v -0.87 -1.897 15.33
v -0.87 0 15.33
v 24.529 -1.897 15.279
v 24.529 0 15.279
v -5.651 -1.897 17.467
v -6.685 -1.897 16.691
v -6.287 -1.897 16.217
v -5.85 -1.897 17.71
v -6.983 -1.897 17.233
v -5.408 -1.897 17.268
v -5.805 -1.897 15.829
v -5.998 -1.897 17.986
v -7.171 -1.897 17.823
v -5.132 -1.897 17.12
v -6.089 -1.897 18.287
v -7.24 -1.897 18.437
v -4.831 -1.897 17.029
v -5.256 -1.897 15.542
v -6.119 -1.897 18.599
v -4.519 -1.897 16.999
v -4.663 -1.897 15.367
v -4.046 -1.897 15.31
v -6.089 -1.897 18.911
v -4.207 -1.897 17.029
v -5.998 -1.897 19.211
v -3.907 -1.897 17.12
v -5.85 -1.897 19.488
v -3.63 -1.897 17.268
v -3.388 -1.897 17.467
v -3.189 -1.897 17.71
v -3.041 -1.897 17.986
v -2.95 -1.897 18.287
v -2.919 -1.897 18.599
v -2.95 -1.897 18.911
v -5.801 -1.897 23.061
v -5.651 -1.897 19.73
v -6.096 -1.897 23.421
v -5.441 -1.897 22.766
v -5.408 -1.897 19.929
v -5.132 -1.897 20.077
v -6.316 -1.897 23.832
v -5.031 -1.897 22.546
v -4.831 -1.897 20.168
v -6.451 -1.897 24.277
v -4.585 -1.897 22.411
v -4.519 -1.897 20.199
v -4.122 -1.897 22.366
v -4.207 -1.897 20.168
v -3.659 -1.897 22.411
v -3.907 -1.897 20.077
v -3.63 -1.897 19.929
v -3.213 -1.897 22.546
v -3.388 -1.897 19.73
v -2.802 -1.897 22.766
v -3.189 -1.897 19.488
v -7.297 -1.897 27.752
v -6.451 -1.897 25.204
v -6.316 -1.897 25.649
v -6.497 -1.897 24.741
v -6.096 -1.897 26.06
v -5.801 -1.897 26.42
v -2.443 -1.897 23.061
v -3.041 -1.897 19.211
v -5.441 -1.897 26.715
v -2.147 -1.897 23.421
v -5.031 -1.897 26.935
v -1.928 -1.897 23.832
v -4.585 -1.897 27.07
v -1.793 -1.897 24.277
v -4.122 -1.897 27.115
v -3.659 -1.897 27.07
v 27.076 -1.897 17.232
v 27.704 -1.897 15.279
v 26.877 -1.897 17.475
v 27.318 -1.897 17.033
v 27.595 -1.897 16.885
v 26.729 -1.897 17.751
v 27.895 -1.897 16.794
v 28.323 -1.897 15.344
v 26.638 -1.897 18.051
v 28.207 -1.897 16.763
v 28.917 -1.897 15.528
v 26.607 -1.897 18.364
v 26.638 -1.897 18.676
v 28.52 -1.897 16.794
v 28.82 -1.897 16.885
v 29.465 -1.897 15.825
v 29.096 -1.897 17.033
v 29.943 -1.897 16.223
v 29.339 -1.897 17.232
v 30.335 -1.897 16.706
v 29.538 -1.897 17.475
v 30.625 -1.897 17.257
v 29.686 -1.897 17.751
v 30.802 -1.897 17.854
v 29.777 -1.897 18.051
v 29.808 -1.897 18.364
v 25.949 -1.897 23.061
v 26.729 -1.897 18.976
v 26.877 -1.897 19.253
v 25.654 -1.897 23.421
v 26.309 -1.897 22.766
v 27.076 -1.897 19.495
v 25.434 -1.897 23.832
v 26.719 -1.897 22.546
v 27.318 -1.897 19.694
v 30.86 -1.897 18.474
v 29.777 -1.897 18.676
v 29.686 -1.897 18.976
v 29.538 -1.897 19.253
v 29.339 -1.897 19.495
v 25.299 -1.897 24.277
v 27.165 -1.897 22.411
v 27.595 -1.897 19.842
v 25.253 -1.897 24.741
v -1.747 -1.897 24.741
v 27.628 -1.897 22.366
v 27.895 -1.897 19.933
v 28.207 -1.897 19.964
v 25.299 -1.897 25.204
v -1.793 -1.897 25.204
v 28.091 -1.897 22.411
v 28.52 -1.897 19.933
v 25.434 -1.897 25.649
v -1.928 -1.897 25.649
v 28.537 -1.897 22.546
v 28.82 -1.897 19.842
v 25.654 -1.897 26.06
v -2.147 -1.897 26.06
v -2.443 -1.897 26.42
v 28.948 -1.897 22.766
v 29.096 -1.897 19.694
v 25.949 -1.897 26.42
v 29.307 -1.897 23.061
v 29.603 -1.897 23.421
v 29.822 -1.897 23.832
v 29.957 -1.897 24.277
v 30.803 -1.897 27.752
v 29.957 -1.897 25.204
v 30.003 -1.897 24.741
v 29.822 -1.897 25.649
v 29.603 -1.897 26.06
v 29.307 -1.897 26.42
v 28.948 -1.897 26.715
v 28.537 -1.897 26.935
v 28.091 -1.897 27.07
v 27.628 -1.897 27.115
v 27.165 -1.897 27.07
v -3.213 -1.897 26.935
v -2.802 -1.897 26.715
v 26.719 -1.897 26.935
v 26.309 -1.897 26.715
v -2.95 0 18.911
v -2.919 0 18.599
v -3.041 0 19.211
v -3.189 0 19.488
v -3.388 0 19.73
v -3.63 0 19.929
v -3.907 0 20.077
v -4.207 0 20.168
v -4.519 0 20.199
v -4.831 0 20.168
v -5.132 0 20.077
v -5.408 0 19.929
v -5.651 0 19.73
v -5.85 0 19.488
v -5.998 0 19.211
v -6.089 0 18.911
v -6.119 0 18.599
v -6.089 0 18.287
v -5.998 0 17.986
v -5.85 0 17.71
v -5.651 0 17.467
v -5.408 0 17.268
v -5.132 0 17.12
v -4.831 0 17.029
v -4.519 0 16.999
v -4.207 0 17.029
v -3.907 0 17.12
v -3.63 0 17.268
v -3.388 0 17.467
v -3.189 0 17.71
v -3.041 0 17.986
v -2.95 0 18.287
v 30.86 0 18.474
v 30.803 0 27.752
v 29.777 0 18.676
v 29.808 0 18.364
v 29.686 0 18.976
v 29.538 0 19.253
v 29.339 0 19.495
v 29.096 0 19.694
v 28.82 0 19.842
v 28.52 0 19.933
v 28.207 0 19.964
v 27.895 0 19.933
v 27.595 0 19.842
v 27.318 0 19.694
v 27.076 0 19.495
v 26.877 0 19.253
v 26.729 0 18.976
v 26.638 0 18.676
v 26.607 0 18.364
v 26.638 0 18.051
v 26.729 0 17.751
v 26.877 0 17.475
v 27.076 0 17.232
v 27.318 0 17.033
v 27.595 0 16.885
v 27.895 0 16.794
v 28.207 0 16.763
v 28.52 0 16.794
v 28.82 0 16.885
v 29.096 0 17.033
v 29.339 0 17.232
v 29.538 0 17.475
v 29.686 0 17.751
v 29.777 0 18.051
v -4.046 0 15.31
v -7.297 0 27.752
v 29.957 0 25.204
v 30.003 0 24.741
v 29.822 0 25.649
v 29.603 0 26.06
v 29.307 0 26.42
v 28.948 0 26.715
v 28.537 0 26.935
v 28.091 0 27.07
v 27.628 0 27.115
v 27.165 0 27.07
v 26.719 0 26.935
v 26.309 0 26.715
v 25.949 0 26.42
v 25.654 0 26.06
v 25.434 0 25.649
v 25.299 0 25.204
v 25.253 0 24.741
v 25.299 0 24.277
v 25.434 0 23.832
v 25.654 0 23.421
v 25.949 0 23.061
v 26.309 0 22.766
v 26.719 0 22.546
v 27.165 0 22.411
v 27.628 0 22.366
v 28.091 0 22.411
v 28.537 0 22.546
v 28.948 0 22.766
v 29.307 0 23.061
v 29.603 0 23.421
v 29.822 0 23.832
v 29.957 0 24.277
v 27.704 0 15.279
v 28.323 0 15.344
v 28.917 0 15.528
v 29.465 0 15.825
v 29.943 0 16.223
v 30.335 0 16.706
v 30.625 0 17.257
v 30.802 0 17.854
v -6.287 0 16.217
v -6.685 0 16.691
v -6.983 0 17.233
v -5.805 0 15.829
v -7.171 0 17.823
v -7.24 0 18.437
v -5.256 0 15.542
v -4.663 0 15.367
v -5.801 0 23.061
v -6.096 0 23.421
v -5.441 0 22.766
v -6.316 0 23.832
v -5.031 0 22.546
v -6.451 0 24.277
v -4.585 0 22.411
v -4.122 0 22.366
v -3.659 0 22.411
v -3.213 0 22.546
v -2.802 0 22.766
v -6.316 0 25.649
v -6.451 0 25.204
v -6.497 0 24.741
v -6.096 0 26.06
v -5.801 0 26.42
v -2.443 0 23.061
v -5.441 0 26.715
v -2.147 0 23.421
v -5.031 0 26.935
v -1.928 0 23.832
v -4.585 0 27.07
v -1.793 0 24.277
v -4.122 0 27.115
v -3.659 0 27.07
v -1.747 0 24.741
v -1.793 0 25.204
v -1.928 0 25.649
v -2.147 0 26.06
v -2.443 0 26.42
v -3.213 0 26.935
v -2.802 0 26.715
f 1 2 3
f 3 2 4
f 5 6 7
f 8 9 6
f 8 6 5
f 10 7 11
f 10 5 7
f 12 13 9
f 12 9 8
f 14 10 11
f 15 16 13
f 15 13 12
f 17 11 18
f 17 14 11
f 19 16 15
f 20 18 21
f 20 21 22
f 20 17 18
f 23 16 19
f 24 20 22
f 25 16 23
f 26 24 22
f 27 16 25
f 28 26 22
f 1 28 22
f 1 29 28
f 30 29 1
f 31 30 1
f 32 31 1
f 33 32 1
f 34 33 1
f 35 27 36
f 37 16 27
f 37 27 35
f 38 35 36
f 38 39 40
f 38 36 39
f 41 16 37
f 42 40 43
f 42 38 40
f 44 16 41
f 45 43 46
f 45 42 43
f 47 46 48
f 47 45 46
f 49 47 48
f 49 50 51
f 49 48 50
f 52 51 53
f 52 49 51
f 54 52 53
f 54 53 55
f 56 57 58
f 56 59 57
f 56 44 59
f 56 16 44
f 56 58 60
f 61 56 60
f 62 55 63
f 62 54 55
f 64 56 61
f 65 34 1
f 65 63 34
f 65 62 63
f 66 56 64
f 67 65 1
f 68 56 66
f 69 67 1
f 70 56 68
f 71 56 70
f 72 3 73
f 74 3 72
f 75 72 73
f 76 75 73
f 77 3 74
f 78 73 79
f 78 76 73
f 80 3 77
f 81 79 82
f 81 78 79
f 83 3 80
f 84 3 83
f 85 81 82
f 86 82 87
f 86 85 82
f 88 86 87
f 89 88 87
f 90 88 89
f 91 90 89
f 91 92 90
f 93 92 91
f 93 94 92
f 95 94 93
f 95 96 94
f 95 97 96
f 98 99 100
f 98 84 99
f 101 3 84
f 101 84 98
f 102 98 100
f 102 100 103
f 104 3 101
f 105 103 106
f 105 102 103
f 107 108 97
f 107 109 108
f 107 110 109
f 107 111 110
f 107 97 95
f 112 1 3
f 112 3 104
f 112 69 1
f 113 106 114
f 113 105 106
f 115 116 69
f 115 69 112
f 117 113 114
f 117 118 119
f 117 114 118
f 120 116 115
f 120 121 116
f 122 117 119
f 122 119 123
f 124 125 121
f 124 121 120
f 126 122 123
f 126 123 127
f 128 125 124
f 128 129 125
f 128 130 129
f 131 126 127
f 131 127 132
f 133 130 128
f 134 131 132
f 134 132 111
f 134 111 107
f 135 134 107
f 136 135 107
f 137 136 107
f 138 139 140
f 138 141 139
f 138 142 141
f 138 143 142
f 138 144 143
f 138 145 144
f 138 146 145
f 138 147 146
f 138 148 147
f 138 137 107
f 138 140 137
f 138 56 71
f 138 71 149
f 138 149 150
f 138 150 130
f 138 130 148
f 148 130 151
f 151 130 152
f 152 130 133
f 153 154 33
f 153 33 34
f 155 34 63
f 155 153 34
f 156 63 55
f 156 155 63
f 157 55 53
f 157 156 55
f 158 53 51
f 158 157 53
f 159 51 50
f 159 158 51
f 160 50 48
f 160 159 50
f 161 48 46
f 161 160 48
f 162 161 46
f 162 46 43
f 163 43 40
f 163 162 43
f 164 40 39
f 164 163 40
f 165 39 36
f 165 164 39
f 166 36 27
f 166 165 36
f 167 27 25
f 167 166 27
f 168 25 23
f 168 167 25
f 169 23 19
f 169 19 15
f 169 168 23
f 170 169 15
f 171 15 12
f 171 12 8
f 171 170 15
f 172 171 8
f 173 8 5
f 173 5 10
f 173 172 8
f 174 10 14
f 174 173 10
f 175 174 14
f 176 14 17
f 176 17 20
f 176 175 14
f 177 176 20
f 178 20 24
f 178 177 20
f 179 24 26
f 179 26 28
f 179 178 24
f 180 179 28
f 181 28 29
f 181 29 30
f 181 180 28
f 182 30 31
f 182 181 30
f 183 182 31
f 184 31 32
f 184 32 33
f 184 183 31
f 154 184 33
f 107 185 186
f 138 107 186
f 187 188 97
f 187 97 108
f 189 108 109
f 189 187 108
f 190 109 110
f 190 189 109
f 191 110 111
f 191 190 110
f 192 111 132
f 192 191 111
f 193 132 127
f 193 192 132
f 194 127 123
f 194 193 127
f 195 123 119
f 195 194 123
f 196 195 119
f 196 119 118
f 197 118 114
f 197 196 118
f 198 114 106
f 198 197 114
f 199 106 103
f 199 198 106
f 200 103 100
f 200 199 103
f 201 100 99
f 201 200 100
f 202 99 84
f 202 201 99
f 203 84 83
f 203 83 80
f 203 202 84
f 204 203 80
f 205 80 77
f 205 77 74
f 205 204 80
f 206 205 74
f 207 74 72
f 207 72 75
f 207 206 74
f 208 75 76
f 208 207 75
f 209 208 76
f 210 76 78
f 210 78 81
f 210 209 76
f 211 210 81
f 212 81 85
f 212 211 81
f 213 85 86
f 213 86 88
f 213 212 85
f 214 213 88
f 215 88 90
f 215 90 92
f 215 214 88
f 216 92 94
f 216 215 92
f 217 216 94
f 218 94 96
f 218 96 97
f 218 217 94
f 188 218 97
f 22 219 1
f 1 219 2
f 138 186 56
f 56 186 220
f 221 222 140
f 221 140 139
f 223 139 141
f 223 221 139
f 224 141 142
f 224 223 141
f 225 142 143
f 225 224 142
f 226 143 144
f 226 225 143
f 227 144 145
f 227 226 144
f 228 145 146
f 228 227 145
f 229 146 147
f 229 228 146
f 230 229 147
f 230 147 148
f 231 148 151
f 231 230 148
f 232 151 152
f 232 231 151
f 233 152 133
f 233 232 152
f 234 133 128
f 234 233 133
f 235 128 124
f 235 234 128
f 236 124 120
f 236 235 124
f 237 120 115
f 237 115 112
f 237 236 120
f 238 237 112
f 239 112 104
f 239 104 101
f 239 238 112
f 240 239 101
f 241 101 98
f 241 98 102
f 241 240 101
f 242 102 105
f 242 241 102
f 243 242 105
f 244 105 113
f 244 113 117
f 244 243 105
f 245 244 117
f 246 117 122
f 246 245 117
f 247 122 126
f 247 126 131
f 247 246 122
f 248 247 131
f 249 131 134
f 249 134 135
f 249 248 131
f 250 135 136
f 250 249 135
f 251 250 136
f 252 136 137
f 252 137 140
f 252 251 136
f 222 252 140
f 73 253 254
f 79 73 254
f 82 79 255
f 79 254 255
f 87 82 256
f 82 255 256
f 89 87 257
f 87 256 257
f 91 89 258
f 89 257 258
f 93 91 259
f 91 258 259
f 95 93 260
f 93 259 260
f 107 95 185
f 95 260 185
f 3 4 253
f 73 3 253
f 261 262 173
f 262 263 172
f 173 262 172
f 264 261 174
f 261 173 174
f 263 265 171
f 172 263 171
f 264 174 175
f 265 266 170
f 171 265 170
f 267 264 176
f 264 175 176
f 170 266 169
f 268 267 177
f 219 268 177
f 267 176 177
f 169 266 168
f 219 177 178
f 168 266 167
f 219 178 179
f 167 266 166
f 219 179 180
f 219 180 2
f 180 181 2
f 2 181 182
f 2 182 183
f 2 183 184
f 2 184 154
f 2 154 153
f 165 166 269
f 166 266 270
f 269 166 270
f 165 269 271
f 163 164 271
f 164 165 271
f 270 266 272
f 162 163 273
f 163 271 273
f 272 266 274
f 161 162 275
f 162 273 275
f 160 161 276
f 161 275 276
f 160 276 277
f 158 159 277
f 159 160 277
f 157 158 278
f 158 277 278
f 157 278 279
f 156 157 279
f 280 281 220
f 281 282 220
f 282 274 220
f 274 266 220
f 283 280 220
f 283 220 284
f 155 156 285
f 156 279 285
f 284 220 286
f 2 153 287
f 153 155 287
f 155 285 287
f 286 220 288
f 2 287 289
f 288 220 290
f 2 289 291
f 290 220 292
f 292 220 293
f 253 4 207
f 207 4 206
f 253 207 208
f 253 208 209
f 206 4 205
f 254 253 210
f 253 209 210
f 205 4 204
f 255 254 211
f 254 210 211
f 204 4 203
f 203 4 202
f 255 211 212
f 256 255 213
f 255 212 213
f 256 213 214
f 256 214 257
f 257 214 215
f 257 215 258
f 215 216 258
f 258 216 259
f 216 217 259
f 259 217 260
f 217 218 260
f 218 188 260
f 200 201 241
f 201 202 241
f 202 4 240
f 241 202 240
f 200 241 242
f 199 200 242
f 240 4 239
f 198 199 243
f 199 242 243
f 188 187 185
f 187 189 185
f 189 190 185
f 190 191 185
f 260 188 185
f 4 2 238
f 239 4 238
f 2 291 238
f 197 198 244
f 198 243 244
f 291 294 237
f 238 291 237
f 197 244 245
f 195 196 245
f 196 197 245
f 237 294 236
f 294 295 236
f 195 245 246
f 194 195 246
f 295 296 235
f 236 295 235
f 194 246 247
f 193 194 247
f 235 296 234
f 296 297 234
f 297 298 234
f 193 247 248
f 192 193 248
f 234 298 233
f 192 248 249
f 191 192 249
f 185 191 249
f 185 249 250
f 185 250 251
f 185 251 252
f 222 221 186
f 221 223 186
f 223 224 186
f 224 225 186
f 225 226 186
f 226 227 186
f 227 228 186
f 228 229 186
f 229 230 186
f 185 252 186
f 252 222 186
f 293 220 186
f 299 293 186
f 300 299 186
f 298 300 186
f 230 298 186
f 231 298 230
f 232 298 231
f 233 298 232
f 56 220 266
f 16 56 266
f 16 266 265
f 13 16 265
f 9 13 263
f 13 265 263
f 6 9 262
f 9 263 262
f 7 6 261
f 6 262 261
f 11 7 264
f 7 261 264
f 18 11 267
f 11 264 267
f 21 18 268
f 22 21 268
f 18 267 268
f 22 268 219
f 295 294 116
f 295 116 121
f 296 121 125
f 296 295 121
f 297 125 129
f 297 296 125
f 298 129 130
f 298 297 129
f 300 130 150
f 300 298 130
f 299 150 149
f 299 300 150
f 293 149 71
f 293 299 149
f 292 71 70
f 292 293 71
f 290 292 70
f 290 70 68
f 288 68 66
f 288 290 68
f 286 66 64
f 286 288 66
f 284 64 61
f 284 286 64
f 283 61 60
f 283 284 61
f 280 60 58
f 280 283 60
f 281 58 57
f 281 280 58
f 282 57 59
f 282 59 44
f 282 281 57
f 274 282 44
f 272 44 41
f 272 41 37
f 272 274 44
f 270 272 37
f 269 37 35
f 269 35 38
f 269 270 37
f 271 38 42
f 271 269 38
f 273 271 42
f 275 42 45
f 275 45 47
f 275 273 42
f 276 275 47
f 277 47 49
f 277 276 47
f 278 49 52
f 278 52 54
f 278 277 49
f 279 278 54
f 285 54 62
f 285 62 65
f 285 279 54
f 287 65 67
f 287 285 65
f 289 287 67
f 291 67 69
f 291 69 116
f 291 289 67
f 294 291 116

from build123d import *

# Parameters (mm, degrees)
F0_R     = 1.6002
F0_R_2   = 2.3749
F1_DEPTH = 1.89738


with BuildPart() as f1:
    # F0 (on Front) → F1 (new body)
    with BuildSketch(Plane.XZ):
        with BuildLine():
            Line((30.803165, 27.752104), (-7.296835, 27.752104))
            Line((-7.296835, 27.752104), (-7.240266, 18.437498))
            ThreePointArc((-7.240266, 18.437498), (-6.286852, 16.216634), (-4.046344, 15.310343))
            Line((-4.046344, 15.310343), (-0.869708, 15.329635))
            Line((-0.869708, 15.329635), (24.528914, 15.279349))
            Line((24.528914, 15.279349), (27.703914, 15.279349))
            ThreePointArc((27.703914, 15.279349), (29.943251, 16.222922), (30.859515, 18.473572))
            Line((30.859515, 18.473572), (30.803165, 27.752104))
        make_face()
        with Locations((-4.519141, 18.598825)):
            Circle(F0_R, mode=Mode.SUBTRACT)
        with Locations((28.207415, 18.36364)):
            Circle(F0_R, mode=Mode.SUBTRACT)
        with Locations((-4.121835, 24.740549)):
            Circle(F0_R_2, mode=Mode.SUBTRACT)
        with Locations((27.628165, 24.740549)):
            Circle(F0_R_2, mode=Mode.SUBTRACT)
    extrude(amount=F1_DEPTH)


solid = f1.part
